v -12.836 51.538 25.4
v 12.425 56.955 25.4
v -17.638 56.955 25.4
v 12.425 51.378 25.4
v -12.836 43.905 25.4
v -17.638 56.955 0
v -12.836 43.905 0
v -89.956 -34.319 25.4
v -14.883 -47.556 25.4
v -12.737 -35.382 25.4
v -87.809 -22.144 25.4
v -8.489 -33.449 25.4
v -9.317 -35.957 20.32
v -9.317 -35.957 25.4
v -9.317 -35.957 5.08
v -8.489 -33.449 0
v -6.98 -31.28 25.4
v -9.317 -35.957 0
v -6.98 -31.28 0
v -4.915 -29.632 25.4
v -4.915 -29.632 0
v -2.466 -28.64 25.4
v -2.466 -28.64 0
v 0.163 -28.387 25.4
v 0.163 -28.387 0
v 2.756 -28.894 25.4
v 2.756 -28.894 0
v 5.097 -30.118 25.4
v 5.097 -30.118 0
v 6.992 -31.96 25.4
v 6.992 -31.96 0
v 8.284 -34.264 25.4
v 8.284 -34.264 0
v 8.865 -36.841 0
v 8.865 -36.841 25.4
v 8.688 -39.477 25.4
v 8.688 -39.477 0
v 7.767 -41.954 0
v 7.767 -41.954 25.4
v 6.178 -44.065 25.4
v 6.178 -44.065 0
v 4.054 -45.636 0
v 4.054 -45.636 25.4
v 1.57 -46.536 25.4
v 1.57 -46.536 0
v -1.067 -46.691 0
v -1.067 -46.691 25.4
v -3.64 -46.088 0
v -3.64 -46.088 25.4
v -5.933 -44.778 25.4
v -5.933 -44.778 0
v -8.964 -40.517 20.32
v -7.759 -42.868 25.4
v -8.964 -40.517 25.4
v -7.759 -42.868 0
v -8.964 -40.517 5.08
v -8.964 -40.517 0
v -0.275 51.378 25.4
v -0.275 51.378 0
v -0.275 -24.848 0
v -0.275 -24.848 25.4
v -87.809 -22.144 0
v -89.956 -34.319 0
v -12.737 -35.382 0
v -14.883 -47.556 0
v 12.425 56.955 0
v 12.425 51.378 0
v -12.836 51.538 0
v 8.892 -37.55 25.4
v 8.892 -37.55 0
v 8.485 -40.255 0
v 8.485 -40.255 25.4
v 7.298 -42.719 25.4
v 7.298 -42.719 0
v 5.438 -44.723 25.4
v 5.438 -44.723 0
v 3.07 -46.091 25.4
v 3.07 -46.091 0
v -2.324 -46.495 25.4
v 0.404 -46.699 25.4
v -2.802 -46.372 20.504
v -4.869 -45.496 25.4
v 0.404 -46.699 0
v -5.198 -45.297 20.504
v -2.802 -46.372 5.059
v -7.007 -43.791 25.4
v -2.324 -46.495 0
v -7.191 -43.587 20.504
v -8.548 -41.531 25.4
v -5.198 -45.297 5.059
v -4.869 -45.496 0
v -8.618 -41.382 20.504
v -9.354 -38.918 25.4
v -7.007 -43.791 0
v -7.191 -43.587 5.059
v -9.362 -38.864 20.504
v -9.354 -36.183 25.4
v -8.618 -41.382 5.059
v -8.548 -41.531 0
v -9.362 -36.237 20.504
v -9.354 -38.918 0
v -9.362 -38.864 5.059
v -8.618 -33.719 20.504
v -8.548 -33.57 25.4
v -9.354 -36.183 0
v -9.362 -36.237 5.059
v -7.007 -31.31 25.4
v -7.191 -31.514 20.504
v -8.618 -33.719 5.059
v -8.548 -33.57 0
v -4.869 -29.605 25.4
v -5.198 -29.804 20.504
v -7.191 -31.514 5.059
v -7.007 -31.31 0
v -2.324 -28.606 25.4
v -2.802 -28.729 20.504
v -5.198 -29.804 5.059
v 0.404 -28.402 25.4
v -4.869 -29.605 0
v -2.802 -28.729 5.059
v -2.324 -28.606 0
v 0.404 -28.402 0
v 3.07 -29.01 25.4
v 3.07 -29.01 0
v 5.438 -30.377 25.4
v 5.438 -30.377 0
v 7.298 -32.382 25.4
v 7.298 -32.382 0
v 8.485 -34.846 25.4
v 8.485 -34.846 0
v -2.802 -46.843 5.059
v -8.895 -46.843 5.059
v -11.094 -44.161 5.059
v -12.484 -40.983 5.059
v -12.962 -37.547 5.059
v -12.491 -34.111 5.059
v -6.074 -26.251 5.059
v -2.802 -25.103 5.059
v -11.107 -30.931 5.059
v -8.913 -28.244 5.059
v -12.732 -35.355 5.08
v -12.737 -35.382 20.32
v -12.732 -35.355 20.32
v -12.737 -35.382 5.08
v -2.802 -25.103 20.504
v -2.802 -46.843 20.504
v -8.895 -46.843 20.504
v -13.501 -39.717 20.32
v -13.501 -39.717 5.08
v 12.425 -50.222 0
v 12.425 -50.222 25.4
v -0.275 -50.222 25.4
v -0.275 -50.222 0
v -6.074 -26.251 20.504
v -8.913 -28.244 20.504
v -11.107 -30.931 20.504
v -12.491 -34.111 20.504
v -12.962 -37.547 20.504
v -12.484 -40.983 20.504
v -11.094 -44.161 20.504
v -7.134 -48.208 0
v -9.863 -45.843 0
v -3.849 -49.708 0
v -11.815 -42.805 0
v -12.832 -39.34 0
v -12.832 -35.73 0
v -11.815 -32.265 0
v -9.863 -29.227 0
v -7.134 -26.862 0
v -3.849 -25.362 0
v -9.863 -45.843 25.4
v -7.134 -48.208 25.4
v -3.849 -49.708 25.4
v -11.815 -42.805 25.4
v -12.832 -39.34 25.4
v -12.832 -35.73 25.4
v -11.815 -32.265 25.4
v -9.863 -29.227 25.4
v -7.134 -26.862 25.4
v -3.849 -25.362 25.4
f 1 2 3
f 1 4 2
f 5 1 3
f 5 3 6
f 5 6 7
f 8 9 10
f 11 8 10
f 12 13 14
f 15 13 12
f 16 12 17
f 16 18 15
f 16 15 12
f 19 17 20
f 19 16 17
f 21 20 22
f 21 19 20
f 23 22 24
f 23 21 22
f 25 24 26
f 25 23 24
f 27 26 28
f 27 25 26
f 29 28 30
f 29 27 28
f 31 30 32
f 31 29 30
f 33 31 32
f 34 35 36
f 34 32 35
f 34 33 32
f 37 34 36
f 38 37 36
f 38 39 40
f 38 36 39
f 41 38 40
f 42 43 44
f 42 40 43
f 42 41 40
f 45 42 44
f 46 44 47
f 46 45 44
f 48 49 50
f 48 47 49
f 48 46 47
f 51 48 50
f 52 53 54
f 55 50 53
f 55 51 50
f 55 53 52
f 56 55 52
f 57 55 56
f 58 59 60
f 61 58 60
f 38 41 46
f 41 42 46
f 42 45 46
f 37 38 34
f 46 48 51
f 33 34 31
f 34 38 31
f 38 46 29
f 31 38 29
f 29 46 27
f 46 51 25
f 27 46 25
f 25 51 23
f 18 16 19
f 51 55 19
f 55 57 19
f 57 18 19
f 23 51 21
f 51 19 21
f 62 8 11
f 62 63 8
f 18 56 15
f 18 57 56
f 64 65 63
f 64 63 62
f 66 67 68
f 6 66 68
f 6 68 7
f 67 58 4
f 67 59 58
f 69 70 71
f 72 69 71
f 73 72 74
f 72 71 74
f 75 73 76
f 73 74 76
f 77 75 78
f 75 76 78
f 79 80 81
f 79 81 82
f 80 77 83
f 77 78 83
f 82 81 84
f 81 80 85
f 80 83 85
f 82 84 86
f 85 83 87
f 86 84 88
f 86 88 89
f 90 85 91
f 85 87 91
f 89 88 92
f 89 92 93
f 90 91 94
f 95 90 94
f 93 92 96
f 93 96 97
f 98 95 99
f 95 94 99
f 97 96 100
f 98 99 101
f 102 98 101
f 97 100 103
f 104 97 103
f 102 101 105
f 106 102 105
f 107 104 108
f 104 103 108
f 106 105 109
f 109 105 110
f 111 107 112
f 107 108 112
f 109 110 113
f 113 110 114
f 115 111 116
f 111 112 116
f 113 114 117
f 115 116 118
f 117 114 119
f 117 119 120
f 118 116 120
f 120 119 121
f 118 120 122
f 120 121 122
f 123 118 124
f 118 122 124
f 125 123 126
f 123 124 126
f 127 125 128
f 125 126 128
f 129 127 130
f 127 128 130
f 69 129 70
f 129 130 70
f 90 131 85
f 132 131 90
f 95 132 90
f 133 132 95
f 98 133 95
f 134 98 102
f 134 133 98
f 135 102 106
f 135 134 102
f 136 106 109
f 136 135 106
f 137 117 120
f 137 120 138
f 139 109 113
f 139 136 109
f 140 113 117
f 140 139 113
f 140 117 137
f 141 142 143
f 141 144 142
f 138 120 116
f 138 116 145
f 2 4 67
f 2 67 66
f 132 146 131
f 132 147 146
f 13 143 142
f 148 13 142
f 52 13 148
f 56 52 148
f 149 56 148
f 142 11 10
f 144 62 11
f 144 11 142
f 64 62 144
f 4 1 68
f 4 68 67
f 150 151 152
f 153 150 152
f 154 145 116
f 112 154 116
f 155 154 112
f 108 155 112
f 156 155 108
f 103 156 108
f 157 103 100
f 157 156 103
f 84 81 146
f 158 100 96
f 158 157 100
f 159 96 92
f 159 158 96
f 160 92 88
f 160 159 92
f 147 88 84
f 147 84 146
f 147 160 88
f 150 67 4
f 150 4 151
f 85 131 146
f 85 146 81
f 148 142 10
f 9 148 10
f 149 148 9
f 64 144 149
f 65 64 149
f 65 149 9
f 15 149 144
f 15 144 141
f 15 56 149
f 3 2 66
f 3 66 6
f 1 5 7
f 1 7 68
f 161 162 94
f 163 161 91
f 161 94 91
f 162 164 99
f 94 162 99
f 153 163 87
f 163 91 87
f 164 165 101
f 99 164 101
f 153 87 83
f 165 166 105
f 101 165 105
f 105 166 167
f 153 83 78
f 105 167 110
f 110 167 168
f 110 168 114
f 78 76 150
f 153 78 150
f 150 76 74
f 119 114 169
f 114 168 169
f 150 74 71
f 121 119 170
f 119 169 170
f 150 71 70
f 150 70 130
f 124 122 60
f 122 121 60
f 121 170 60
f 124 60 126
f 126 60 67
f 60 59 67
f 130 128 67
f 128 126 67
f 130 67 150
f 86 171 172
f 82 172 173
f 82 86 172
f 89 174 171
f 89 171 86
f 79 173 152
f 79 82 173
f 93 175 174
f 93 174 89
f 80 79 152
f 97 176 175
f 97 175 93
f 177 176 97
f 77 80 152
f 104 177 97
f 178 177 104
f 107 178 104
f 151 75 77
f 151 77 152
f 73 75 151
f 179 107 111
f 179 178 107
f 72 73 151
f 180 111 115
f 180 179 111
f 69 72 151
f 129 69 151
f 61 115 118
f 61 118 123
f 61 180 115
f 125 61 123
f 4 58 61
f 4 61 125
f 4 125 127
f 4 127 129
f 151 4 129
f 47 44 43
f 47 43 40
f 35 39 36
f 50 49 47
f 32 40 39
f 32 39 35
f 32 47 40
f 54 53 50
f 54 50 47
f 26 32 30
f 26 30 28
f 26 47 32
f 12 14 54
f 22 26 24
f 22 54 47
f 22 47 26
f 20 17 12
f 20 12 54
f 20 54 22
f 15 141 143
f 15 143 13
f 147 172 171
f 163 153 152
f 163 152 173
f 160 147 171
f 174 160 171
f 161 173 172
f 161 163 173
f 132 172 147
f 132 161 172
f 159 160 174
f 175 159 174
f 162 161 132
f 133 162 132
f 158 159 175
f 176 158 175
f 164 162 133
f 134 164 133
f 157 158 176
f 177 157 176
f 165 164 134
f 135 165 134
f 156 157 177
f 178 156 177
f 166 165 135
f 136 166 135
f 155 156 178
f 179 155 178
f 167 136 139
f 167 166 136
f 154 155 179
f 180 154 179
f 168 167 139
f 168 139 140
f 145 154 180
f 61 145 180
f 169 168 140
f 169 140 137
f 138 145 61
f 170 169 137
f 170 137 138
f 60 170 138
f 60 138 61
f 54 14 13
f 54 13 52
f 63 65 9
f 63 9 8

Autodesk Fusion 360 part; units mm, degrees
sketch "Sketch1" plane through (0, 0, 0) normal (0, 0, 1) x (1, 0, 0)
  line L0 (-12.975, 51.3784) -> (12.425, 51.3784)
  line L1 (12.425, 51.3784) -> (12.425, -50.2216)
  line L2 (12.425, -50.2216) -> (-12.975, -50.2216)
  line L3 (-12.975, -50.2216) -> (-12.975, 51.3784)
  line L4 (-0.275, 51.3784) -> (-0.275, -50.2216)
  circle A0 centre (-0.275, -37.535) radius 12.6866
  dimension "d1" = 25.4
  dimension "d2" = 101.6
extrude "Extrude1" add sketch "Sketch1" along normal blind 25.4 contours L0 L1 L2 L4 A0 | L4 A0 | L4 A0 makes body 1
sketch "Sketch2" plane through (0, 0, 0) normal (0, 0, 1) x (1, 0, 0)
  line L0 (-12.6711, 51.3224) -> (-0.3089, 51.3224)
  line L1 (-0.3089, 51.3224) -> (-0.3089, -24.9086)
  line L2 (-0.3089, -24.9086) -> (-12.6711, -24.9086)
  line L3 (-12.6711, -24.9086) -> (-12.6711, 51.3224)
  circle A0 centre (-0.2821, -37.5504) radius 9.1745
  line L4 (-4.7108, -24.9086) -> (-0.2821, -24.9086)
  line L5 (-0.2821, -24.9086) -> (-0.2821, -37.5504)
  line L6 (-0.2821, -37.5504) -> (-4.7108, -37.5504)
  line L7 (-4.7108, -37.5504) -> (-4.7108, -24.9086)
extrude "Extrude2" add sketch "Sketch2" along normal blind 25.4 separate body makes body 2
extrude "Extrude3" cut sketch "Sketch2" along normal blind 261.62 contours A0 L5 L6 L7 | A0 L5 L6 L7 bodies 1
sketch "Sketch3" plane through (0, 0, 25.4) normal (0, 0, 1) x (-1, 0, 0)
  line L0 (4.7108, 24.9086) -> (4.7108, 29.5156)
  arc A0 (4.7108, 29.5156) -> (0.2821, 28.3759) centre (0.2821, 37.5504) ccw
  line L1 (0.2821, 28.3759) -> (0.2821, 24.9086)
  line L2 (0.2821, 24.9086) -> (0.3089, 24.9086)
  line L3 (0.3089, 24.9086) -> (0.3089, -51.3224)
  line L4 (0.3089, -51.3224) -> (12.6711, -51.3224)
  line L5 (12.6711, -51.3224) -> (12.6711, 24.9086)
  line L6 (12.6711, 24.9086) -> (4.7108, 24.9086)
  line L7 (0.3089, 24.9086) -> (4.7108, 24.9086)
  line L8 (0.2821, 28.3759) -> (4.7108, 29.5156)
extrude "Extrude4" cut sketch "Sketch3" against normal blind 5.08 contours L0 L1 L2 L7 L8 bodies 2
sketch "Sketch4" plane through (0, 0, 0) normal (0, 0, -1) x (1, 0, 0)
  line L0 (-4.7108, 29.5156) -> (-4.7108, 24.9086)
  line L1 (-4.7108, 24.9086) -> (-12.6711, 24.9086)
  line L2 (-12.6711, 24.9086) -> (-12.6711, -51.3224)
  line L3 (-12.6711, -51.3224) -> (-0.3089, -51.3224)
  line L4 (-0.3089, -51.3224) -> (-0.3089, 24.9086)
  line L5 (-0.3089, 24.9086) -> (-0.2821, 24.9086)
  line L6 (-0.2821, 24.9086) -> (-0.2821, 28.3759)
  arc A0 (-0.2821, 28.3759) -> (-4.7108, 29.5156) centre (-0.2821, 37.5504) ccw
  line L7 (-4.7108, 29.5156) -> (-0.2821, 28.3759)
  line L8 (-0.3089, 24.9086) -> (-4.7108, 24.9086)
extrude "Extrude5" cut sketch "Sketch4" against normal blind 5.08 contours L0 L5 L6 L7 L8 bodies 2
ref_plane "WorkPlane1" through (-12.9616, -37.535, 13.4339) normal (-1, 0, 0) x (0, 1, 0)
sketch "Sketch5" plane through (-12.9616, -37.535, 13.4339) normal (-1, 0, 0) x (0, 1, 0)
  line L0 (12.5644, -7.0697) -> (-9.3081, -7.0697)
  line L1 (-9.3081, -7.0697) -> (-9.3081, 8.3746)
  line L2 (-9.3081, 8.3746) -> (12.5644, 8.3746)
  line L3 (12.5644, 8.3746) -> (12.5644, -7.0697)
extrude "Extrude6" cut sketch "Sketch5" against normal blind 10.16 bodies 1
sketch "Sketch6" plane through (0, 0, 25.4) normal (0, 0, 1) x (-1, 0, 0)
  circle A0 centre (0.2821, 37.5504) radius 9.1745
  line L0 (-12.425, -51.3784) -> (0.275, -51.3784)
  line L1 (0.275, -51.3784) -> (0.275, 24.8484)
  arc A1 (0.275, 24.8484) -> (0.275, 50.2216) centre (0.275, 37.535) ccw
  line L2 (0.275, 50.2216) -> (-12.425, 50.2216)
  line L3 (-12.425, 50.2216) -> (-12.425, -51.3784)
  line L4 (-12.425, -51.3784) -> (-12.425, -56.9551)
  line L5 (-12.425, -56.9551) -> (17.6379, -56.9551)
  line L6 (17.6379, -56.9551) -> (12.8362, -43.9046)
  line L7 (12.8362, -43.9046) -> (12.8362, -51.5381)
  line L8 (12.8362, -51.5381) -> (-12.425, -51.3784)
extrude "Extrude7" add sketch "Sketch6" against normal blind 25.4 separate body contours L4 L5 L6 L7 L8 makes body 3
combine "Combine1" operation add target body 1 tool bodies 3
copy_body "Body->Comp1" bodies 1 removing the originals makes body 4 in component "Component"
copy_body "Body->Comp2" bodies 2 removing the originals makes body 5 in component "Component'"
component "Component" placed x (1, 0, 0) y (0, 1, 0) z (0, 0, 1) at (0, 0, 0)
component "Component'" placed x (0.173648, 0.984808, 0) y (-0.984808, 0.173648, 0) z (0, 0, 1) at (-37.2131, -30.752, 0)
